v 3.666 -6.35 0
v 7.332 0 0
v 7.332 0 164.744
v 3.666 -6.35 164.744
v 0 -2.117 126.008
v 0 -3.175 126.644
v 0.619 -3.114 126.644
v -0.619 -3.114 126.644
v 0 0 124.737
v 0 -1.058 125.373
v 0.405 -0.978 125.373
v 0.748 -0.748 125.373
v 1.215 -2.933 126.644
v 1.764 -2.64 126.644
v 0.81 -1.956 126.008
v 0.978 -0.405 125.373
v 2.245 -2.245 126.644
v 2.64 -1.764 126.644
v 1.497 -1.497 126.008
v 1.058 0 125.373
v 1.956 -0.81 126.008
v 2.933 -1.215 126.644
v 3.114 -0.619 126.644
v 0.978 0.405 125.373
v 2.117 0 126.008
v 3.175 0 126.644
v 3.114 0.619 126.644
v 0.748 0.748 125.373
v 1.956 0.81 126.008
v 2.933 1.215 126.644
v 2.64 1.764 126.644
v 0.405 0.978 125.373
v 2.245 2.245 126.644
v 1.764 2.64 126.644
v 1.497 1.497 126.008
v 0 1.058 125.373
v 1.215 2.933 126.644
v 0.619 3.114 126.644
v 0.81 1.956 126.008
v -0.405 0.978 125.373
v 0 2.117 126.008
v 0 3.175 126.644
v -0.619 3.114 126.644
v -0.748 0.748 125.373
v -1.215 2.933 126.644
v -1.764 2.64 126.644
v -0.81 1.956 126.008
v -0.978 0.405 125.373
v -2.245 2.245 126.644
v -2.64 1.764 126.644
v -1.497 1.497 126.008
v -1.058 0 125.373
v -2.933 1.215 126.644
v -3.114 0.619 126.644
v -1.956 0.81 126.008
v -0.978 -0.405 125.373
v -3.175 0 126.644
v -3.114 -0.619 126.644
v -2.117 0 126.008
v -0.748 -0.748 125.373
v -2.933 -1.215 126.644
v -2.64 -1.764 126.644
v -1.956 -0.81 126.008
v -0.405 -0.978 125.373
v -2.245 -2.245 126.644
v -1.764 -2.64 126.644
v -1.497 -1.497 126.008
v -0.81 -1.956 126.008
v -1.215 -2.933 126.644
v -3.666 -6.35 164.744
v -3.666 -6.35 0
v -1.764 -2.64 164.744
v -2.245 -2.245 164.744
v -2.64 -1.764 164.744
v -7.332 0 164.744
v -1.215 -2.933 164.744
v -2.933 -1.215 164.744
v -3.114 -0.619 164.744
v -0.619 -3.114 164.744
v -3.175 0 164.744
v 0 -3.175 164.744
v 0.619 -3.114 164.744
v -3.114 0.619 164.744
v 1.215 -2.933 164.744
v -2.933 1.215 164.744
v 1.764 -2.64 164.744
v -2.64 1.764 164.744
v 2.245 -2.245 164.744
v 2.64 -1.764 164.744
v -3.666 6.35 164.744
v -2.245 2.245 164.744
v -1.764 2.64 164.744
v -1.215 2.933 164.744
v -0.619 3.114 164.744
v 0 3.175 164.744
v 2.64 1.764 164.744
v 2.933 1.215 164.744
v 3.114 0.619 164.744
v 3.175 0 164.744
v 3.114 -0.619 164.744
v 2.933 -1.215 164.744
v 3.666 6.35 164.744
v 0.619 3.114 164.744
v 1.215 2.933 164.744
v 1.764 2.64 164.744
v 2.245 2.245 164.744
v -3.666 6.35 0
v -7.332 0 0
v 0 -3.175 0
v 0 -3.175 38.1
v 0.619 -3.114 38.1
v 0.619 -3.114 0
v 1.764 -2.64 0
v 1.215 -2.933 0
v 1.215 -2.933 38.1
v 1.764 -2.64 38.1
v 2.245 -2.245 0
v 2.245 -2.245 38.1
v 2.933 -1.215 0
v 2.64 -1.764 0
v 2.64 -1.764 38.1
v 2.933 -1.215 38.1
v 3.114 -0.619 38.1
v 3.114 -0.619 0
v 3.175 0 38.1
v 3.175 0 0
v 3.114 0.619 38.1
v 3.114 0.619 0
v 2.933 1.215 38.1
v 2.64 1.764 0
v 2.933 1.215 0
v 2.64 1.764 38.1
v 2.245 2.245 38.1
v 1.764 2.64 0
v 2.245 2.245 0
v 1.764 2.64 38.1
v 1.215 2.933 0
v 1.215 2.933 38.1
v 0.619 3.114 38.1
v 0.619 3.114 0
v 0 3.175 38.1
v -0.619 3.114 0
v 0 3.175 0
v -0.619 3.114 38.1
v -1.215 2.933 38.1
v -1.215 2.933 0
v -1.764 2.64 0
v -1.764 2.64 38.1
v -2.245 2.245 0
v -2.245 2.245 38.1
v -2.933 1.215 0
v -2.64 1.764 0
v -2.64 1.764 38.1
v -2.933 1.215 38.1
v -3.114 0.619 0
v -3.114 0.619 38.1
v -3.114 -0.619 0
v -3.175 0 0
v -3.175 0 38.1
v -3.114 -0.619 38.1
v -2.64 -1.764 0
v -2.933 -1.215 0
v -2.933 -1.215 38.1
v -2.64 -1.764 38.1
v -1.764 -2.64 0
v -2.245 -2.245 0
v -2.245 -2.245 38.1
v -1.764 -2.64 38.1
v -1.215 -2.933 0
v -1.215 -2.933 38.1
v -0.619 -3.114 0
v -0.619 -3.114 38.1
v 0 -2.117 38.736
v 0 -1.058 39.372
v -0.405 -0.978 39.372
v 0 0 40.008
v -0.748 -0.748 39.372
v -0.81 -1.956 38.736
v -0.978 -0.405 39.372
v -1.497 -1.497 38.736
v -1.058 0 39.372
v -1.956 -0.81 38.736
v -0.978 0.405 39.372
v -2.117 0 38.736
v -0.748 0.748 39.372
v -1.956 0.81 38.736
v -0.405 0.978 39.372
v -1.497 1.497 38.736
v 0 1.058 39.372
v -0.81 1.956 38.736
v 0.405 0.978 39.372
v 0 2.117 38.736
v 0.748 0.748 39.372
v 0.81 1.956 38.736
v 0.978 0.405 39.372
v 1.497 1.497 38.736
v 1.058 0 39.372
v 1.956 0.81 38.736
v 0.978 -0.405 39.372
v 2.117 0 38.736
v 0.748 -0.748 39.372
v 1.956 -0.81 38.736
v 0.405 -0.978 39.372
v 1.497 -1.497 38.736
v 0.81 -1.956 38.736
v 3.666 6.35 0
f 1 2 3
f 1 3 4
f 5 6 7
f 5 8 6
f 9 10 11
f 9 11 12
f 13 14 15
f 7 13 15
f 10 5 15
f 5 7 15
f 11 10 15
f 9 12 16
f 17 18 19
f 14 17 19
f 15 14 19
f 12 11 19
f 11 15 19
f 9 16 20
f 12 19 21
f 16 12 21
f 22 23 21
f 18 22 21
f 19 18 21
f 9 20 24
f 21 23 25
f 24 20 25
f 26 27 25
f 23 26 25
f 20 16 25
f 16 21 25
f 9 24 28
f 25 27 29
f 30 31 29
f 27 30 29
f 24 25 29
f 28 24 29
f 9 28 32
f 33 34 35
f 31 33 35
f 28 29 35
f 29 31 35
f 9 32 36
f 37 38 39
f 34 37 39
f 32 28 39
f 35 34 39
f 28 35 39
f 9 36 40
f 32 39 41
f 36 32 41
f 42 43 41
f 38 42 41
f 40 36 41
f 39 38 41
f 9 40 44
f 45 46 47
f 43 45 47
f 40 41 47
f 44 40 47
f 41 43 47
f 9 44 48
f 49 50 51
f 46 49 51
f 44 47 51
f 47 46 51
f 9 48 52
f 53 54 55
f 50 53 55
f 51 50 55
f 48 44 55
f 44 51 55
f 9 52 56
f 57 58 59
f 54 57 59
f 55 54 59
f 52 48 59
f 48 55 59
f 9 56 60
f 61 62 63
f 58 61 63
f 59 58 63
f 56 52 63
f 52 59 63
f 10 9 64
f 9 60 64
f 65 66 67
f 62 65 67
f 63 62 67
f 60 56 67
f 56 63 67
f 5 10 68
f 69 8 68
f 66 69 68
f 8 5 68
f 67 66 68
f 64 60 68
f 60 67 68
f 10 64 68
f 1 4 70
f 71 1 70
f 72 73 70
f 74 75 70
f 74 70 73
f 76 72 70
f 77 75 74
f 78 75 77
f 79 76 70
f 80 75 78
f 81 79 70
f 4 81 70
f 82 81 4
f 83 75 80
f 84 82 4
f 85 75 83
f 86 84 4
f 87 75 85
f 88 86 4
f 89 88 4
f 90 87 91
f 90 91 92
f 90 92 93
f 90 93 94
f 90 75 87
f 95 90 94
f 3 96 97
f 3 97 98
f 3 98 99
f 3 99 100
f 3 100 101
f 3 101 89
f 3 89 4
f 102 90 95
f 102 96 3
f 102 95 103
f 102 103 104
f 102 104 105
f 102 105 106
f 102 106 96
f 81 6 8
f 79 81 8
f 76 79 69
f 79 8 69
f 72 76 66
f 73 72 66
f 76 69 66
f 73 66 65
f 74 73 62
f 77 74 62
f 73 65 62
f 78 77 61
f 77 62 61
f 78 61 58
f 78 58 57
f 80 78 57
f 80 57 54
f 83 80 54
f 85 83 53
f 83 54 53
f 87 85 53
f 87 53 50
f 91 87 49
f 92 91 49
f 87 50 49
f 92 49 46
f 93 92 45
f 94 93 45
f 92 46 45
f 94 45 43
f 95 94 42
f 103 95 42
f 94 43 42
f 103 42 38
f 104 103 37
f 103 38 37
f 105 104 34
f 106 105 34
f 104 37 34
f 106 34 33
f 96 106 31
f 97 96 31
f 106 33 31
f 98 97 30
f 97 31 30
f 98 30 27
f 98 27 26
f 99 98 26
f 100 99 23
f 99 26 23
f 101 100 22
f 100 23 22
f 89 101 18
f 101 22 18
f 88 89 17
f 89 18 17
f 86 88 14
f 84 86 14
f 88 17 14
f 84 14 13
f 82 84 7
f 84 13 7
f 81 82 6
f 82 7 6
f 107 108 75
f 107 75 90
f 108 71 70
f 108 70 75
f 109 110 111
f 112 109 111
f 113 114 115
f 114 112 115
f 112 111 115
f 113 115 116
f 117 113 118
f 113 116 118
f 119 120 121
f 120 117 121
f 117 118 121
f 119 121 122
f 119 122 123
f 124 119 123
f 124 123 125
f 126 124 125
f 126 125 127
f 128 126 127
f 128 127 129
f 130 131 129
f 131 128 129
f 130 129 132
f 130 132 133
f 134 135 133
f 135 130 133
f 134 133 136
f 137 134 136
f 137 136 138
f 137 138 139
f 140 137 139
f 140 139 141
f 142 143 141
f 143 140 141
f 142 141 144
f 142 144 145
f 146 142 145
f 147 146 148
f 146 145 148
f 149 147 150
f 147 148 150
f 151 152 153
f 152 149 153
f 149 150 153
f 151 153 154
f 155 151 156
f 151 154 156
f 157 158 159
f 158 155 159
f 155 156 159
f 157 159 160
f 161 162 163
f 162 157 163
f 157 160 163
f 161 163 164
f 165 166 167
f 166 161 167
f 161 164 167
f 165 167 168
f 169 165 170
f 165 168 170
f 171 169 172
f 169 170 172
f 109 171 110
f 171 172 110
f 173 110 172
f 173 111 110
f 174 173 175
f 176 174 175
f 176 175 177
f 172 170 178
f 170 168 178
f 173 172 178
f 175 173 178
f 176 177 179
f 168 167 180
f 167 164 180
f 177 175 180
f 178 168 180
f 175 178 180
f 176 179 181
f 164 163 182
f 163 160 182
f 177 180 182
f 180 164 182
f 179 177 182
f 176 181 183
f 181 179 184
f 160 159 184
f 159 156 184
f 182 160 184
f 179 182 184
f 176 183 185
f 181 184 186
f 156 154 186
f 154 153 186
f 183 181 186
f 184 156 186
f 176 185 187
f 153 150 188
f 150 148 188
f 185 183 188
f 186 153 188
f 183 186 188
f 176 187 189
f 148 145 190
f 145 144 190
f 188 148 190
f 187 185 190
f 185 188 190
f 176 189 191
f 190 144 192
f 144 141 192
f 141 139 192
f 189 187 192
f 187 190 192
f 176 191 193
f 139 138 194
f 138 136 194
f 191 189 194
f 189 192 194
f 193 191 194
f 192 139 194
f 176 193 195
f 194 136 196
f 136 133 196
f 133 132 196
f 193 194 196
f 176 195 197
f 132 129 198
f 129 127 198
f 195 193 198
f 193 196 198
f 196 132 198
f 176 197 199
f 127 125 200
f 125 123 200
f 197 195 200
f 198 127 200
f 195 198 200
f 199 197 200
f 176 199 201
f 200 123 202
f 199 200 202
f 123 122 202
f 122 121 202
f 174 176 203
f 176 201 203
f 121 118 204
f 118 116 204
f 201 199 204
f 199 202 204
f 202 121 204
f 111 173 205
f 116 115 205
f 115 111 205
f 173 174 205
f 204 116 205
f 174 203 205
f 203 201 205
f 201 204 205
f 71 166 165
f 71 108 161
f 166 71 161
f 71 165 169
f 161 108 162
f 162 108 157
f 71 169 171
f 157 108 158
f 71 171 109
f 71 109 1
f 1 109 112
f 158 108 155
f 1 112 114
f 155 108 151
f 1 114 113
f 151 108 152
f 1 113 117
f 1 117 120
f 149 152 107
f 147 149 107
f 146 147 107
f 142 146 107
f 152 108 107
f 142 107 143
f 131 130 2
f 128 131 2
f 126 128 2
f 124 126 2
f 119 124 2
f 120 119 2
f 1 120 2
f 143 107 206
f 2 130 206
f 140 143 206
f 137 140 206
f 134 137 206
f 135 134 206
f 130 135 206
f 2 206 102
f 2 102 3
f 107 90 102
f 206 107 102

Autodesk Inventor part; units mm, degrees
ref_plane "YZ Plane" through (0, 0, 0) normal (1, 0, 0) x (0, 1, 0)
ref_plane "XZ Plane" through (0, 0, 0) normal (0, 1, 0) x (-1, 0, 0)
sketch "Sketch1" plane through (0, 0, 0) normal (0, 0, 1) x (1, 0, 0)
  line L0 (-3.6662, 6.35) -> (3.6662, 6.35)
  line L1 (3.6662, 6.35) -> (7.3323, 0)
  line L2 (7.3323, 0) -> (3.6662, -6.35)
  line L3 (3.6662, -6.35) -> (-3.6662, -6.35)
  line L4 (-3.6662, -6.35) -> (-7.3323, 0)
  line L5 (-7.3323, 0) -> (-3.6662, 6.35)
  point P0 (0, 0)
  point P1 (0, 0)
  dimension "d0" = 12.7
extrude "Extrusion1" add sketch "Sketch1" along normal blind 164.7444
ref_plane "Work Plane1" through (0, 0, 82.3722) normal (0, 0, -1) x (-1, 0, 0)
sketch "Sketch2" plane through (0, 0, 164.7444) normal (0, 0, 1) x (1, 0, 0)
  point P0 (0, 0)
  point P1 (0, 0)
hole "Hole1" at (0, 0, 164.7444) direction (0, 0, -1) diameter 6.35 depth 38.1 tip angle 118
thread "Thread1" size "1/4-20 UNC" class "2B" standard "ANSI Unified Screw Threads" full length
mirror "Mirror1" about plane through (0, 0, 82.3722) normal (0, 0, -1) of "Hole1"
properties part number "Steel Shaft for Jeep" material "Steel, Carbon"
